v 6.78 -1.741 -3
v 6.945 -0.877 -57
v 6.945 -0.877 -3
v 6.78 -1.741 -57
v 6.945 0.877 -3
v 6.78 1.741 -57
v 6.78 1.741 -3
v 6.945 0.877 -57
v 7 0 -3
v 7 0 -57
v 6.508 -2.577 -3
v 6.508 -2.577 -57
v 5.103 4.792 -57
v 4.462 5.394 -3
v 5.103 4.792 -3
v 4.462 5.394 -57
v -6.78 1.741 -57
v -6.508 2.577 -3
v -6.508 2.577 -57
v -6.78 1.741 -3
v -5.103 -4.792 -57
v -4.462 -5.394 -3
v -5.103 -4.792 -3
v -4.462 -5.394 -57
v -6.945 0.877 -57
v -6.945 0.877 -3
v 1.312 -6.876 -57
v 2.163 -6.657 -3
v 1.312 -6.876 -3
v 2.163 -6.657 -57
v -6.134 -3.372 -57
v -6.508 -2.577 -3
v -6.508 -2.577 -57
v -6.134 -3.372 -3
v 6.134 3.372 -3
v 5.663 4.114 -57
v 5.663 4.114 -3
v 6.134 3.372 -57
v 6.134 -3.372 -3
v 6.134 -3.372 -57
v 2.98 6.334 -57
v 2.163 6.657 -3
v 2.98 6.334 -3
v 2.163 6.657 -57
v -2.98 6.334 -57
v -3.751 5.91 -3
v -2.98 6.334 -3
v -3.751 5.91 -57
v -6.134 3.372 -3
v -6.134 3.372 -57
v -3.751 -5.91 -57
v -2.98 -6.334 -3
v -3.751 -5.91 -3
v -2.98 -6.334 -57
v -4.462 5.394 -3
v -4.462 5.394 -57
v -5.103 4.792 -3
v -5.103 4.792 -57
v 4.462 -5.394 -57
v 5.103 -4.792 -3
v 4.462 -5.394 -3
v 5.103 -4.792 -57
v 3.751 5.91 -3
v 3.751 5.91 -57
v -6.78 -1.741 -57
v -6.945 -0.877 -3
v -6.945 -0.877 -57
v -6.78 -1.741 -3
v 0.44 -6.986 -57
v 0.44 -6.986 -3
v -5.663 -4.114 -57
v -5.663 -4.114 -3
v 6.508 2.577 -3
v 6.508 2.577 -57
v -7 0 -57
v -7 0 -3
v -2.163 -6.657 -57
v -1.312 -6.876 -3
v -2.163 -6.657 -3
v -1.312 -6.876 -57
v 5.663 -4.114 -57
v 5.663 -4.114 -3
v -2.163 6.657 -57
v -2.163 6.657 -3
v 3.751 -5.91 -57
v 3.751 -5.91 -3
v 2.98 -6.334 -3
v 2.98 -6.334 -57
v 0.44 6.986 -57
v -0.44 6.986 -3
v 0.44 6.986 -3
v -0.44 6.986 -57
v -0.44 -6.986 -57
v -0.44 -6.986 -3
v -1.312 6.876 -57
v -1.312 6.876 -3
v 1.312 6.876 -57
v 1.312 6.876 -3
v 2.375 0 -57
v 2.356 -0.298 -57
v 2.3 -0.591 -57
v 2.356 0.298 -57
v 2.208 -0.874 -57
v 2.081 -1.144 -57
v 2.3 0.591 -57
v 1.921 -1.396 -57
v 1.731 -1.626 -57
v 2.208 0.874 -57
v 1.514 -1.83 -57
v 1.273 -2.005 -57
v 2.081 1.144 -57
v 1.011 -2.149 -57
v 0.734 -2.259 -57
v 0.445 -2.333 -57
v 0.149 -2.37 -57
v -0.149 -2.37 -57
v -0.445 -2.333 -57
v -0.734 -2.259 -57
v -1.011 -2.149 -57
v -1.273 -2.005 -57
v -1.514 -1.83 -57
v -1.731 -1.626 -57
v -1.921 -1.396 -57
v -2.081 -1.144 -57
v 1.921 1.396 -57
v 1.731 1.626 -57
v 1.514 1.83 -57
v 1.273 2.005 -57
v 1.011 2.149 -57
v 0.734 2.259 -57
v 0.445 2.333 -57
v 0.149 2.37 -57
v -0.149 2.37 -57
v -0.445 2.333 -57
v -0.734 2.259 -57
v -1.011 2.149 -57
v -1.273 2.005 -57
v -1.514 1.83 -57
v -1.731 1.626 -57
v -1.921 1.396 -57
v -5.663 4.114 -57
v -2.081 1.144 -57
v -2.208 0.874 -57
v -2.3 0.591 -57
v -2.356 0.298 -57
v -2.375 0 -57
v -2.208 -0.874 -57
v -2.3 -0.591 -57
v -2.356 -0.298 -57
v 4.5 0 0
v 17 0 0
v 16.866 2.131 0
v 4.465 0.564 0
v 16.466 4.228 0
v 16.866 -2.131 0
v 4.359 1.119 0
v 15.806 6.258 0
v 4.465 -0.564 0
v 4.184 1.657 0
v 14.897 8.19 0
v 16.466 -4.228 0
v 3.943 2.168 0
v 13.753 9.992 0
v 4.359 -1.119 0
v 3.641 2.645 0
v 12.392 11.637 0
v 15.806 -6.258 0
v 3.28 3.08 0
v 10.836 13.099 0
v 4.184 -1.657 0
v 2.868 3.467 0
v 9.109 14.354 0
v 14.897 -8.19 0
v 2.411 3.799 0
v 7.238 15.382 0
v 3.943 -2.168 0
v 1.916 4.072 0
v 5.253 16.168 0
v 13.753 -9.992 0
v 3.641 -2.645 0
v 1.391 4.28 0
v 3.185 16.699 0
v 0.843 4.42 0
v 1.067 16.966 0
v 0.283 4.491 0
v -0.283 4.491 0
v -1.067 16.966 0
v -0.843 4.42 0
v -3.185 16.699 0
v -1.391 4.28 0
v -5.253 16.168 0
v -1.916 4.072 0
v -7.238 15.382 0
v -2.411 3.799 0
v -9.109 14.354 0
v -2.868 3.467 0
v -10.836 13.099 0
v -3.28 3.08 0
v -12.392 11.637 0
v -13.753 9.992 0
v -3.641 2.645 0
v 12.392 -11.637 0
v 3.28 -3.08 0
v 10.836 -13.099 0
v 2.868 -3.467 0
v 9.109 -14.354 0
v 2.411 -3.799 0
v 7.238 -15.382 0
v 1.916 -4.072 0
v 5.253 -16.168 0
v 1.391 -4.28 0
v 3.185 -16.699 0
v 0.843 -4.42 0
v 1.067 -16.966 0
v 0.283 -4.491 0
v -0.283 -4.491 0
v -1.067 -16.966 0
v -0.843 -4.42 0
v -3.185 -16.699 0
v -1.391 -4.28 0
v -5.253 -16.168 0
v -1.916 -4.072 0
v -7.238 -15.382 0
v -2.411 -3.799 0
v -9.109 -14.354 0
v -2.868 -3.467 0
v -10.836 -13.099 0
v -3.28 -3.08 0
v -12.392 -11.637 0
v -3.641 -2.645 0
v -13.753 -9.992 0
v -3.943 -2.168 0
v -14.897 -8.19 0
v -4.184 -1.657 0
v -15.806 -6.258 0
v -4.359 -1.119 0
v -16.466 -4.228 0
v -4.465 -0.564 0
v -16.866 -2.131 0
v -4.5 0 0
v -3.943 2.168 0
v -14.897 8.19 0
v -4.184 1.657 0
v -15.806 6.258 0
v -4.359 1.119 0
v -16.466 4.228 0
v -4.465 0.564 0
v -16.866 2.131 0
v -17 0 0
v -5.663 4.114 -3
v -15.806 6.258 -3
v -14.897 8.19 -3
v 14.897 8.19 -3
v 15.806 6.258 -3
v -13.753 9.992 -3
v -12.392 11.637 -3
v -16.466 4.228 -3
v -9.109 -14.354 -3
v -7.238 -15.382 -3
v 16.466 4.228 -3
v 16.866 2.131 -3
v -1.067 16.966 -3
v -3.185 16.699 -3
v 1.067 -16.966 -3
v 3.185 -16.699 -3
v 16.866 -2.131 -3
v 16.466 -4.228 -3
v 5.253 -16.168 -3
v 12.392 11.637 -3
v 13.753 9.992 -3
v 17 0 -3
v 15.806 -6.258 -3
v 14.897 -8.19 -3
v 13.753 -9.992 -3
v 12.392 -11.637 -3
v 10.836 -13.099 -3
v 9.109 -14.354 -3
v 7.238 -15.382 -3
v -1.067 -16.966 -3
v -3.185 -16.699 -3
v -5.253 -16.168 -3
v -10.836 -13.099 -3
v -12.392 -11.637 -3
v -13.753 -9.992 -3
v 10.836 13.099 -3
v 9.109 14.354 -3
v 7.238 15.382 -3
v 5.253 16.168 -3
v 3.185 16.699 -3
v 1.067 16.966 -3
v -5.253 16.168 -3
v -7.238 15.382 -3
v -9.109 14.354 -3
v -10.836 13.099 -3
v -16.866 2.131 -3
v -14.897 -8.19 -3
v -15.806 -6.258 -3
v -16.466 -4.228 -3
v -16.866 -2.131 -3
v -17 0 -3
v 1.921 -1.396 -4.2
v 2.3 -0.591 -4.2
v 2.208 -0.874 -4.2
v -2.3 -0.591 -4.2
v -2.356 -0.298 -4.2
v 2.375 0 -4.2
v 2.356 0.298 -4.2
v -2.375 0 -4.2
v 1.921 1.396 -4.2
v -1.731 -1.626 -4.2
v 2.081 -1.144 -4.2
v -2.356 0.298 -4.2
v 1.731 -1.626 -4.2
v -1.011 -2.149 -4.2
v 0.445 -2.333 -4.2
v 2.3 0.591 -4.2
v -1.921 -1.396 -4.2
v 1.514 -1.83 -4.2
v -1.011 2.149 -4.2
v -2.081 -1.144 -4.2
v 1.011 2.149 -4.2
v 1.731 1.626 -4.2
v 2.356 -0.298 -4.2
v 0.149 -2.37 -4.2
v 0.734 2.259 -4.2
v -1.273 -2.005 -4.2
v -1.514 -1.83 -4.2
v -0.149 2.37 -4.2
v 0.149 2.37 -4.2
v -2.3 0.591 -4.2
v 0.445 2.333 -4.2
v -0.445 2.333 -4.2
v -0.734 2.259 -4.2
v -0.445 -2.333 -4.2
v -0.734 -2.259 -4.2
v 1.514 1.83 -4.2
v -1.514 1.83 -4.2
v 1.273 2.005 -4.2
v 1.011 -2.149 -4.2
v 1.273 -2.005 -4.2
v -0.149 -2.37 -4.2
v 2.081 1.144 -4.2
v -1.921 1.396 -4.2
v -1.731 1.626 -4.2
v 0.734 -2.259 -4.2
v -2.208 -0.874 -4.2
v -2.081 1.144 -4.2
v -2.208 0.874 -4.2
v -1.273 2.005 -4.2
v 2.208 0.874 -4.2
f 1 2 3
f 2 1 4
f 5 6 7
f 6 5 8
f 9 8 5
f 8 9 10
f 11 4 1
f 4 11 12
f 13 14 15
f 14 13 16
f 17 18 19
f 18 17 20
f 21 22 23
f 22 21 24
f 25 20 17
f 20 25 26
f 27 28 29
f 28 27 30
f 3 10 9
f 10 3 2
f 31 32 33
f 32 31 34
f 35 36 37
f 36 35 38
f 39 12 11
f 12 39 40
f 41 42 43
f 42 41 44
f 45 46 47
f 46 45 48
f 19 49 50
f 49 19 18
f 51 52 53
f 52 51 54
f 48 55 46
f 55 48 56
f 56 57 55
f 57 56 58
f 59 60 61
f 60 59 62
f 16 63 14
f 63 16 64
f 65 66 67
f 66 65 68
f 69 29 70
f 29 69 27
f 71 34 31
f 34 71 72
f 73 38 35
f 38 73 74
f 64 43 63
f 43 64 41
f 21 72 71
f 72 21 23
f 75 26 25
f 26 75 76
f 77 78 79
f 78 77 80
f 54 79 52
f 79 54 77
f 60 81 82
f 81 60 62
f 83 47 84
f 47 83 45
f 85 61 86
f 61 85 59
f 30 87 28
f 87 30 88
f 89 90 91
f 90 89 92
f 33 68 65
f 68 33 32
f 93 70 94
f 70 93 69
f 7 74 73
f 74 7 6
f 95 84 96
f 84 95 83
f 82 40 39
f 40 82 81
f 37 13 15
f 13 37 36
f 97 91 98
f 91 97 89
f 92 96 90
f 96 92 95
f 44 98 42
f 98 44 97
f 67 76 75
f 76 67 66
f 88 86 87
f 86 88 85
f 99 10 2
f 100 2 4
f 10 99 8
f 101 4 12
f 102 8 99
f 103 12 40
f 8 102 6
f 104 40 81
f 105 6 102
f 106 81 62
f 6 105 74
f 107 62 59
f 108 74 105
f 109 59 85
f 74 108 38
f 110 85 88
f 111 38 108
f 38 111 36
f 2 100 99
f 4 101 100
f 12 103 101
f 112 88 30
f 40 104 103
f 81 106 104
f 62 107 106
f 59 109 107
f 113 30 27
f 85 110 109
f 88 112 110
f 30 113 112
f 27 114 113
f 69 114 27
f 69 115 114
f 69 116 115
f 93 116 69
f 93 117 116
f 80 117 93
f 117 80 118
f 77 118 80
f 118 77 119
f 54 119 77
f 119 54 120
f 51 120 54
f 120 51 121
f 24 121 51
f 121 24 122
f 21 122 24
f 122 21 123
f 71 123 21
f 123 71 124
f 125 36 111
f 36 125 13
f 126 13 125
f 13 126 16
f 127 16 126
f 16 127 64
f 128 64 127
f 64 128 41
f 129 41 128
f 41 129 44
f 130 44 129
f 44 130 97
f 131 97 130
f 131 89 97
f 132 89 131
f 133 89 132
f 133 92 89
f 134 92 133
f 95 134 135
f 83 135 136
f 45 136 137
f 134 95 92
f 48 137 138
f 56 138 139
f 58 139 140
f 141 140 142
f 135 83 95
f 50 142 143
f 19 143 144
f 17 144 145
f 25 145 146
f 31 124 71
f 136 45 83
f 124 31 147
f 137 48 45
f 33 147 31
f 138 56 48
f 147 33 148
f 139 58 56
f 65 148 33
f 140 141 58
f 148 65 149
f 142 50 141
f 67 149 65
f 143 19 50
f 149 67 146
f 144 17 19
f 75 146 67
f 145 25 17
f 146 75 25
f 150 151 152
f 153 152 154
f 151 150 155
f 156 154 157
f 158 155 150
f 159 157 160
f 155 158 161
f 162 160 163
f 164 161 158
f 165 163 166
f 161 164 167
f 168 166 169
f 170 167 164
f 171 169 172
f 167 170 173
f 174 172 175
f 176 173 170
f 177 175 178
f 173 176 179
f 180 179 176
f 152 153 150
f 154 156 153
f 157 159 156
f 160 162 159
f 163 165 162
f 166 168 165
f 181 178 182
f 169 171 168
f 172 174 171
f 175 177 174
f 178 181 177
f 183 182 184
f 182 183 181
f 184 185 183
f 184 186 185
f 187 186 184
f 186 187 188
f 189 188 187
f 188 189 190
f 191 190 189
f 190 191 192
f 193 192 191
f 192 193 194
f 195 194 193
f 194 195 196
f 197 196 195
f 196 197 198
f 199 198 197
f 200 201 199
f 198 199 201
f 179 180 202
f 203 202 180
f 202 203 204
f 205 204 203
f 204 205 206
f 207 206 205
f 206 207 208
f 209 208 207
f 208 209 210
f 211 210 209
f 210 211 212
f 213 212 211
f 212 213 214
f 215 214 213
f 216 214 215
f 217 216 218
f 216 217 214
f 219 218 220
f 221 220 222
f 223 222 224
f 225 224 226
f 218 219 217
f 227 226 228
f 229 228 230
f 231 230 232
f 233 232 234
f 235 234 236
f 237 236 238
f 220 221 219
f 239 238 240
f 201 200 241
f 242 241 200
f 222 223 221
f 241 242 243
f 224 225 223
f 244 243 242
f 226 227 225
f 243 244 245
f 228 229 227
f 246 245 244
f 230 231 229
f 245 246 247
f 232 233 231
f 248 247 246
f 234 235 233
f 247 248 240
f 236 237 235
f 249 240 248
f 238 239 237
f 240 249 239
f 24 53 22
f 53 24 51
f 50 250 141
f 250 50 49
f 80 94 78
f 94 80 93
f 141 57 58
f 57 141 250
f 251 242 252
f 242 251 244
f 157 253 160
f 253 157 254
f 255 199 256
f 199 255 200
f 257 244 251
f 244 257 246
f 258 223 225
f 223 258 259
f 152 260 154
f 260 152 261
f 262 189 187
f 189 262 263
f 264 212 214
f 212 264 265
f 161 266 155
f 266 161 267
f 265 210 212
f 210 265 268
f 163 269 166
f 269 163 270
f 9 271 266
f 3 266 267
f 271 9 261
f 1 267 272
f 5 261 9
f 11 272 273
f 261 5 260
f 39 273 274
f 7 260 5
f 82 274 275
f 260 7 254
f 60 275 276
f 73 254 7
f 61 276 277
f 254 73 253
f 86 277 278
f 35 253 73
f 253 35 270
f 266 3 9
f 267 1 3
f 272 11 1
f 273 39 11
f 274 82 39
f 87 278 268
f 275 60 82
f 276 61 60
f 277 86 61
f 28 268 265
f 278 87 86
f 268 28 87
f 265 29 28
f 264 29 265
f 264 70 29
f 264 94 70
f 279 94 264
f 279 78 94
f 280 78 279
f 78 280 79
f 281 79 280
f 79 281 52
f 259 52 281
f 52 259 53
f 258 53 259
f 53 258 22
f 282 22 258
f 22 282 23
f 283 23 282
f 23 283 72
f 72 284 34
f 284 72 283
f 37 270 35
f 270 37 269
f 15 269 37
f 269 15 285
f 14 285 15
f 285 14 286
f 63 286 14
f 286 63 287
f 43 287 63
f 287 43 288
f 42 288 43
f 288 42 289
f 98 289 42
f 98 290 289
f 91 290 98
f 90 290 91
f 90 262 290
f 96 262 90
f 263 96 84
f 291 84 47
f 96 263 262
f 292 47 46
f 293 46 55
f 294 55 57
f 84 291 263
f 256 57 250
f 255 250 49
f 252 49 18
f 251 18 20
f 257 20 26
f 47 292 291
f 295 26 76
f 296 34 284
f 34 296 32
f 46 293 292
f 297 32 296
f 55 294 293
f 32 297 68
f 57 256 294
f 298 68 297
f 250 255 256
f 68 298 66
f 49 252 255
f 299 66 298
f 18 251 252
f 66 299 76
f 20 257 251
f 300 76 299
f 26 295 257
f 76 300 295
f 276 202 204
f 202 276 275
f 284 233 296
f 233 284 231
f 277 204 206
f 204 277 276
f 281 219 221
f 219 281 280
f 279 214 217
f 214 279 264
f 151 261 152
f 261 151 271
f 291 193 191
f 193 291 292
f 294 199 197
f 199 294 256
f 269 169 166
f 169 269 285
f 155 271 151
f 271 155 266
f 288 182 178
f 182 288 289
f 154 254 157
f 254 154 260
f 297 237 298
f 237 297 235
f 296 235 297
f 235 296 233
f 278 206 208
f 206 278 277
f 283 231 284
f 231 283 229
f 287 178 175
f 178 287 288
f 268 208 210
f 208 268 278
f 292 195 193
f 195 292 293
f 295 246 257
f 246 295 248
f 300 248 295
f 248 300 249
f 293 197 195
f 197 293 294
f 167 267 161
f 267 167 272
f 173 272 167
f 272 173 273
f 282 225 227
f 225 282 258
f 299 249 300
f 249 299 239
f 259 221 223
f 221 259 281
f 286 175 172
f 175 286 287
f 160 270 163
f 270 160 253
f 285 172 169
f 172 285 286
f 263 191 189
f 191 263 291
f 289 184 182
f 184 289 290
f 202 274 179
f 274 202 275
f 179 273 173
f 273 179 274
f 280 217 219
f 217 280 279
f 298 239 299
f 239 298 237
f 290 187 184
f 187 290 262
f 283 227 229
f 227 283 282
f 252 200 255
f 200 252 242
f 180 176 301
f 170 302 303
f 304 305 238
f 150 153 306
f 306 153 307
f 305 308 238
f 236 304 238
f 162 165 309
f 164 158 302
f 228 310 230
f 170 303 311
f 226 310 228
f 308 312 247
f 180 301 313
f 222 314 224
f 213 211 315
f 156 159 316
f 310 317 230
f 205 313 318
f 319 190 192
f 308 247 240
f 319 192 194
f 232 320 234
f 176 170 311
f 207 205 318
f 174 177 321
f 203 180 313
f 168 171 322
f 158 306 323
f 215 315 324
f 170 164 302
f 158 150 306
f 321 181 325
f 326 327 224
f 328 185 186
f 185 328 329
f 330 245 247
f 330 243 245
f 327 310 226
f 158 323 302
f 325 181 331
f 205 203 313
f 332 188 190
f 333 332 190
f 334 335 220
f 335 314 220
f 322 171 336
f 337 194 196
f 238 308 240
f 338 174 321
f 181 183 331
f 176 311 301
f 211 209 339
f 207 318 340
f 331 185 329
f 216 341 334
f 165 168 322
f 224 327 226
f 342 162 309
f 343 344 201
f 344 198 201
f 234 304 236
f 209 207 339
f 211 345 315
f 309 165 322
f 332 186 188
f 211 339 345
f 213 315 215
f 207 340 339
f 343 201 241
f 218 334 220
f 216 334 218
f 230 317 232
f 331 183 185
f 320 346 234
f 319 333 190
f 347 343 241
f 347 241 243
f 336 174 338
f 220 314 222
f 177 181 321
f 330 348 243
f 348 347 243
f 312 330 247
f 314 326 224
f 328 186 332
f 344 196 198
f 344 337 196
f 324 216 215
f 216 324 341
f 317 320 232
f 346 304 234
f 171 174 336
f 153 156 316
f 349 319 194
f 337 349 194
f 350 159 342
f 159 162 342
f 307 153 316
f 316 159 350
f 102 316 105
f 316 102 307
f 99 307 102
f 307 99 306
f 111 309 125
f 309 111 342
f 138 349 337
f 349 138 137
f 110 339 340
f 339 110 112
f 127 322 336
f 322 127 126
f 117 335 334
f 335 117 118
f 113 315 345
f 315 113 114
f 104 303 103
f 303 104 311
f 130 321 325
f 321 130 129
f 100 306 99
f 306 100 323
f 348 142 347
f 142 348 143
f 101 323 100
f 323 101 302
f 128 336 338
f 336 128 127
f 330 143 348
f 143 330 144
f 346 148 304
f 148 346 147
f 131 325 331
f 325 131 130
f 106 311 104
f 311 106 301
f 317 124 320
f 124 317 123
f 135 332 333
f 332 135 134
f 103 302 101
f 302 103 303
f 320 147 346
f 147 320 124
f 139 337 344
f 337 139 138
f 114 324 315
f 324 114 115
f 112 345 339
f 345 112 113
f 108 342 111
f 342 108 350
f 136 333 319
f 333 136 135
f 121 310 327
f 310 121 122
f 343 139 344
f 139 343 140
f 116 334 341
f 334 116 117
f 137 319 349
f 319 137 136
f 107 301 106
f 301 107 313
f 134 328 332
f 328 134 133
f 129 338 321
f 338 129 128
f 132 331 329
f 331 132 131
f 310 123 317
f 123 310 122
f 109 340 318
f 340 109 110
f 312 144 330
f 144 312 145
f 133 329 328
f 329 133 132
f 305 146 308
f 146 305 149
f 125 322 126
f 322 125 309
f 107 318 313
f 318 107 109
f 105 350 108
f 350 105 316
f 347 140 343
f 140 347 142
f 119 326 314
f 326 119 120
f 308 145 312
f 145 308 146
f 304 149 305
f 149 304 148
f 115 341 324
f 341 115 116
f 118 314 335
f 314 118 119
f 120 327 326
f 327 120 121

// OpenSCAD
$fn = 50;


difference() {
	union() {
		translate(v = [0, 0, -57.0000000000]) {
			cylinder(h = 57, r = 7.0000000000);
		}
		translate(v = [0, 0, -3.0000000000]) {
			cylinder(h = 3, r = 17.0000000000);
		}
	}
	union() {
		translate(v = [0, 0, 0]) {
			rotate(a = [0, 0, 0]) {
				difference() {
					union() {
						#translate(v = [0, 0, -57.0000000000]) {
							cylinder(h = 57, r = 2.2500000000);
						}
						#translate(v = [0, 0, -4.2000000000]) {
							cylinder(h = 4.2000000000, r1 = 2.3750000000, r2 = 4.5000000000);
						}
						#translate(v = [0, 0, -57.0000000000]) {
							cylinder(h = 57, r = 2.3750000000);
						}
						#translate(v = [0, 0, -57.0000000000]) {
							cylinder(h = 57, r = 2.2500000000);
						}
					}
					union();
				}
			}
		}
	}
}
